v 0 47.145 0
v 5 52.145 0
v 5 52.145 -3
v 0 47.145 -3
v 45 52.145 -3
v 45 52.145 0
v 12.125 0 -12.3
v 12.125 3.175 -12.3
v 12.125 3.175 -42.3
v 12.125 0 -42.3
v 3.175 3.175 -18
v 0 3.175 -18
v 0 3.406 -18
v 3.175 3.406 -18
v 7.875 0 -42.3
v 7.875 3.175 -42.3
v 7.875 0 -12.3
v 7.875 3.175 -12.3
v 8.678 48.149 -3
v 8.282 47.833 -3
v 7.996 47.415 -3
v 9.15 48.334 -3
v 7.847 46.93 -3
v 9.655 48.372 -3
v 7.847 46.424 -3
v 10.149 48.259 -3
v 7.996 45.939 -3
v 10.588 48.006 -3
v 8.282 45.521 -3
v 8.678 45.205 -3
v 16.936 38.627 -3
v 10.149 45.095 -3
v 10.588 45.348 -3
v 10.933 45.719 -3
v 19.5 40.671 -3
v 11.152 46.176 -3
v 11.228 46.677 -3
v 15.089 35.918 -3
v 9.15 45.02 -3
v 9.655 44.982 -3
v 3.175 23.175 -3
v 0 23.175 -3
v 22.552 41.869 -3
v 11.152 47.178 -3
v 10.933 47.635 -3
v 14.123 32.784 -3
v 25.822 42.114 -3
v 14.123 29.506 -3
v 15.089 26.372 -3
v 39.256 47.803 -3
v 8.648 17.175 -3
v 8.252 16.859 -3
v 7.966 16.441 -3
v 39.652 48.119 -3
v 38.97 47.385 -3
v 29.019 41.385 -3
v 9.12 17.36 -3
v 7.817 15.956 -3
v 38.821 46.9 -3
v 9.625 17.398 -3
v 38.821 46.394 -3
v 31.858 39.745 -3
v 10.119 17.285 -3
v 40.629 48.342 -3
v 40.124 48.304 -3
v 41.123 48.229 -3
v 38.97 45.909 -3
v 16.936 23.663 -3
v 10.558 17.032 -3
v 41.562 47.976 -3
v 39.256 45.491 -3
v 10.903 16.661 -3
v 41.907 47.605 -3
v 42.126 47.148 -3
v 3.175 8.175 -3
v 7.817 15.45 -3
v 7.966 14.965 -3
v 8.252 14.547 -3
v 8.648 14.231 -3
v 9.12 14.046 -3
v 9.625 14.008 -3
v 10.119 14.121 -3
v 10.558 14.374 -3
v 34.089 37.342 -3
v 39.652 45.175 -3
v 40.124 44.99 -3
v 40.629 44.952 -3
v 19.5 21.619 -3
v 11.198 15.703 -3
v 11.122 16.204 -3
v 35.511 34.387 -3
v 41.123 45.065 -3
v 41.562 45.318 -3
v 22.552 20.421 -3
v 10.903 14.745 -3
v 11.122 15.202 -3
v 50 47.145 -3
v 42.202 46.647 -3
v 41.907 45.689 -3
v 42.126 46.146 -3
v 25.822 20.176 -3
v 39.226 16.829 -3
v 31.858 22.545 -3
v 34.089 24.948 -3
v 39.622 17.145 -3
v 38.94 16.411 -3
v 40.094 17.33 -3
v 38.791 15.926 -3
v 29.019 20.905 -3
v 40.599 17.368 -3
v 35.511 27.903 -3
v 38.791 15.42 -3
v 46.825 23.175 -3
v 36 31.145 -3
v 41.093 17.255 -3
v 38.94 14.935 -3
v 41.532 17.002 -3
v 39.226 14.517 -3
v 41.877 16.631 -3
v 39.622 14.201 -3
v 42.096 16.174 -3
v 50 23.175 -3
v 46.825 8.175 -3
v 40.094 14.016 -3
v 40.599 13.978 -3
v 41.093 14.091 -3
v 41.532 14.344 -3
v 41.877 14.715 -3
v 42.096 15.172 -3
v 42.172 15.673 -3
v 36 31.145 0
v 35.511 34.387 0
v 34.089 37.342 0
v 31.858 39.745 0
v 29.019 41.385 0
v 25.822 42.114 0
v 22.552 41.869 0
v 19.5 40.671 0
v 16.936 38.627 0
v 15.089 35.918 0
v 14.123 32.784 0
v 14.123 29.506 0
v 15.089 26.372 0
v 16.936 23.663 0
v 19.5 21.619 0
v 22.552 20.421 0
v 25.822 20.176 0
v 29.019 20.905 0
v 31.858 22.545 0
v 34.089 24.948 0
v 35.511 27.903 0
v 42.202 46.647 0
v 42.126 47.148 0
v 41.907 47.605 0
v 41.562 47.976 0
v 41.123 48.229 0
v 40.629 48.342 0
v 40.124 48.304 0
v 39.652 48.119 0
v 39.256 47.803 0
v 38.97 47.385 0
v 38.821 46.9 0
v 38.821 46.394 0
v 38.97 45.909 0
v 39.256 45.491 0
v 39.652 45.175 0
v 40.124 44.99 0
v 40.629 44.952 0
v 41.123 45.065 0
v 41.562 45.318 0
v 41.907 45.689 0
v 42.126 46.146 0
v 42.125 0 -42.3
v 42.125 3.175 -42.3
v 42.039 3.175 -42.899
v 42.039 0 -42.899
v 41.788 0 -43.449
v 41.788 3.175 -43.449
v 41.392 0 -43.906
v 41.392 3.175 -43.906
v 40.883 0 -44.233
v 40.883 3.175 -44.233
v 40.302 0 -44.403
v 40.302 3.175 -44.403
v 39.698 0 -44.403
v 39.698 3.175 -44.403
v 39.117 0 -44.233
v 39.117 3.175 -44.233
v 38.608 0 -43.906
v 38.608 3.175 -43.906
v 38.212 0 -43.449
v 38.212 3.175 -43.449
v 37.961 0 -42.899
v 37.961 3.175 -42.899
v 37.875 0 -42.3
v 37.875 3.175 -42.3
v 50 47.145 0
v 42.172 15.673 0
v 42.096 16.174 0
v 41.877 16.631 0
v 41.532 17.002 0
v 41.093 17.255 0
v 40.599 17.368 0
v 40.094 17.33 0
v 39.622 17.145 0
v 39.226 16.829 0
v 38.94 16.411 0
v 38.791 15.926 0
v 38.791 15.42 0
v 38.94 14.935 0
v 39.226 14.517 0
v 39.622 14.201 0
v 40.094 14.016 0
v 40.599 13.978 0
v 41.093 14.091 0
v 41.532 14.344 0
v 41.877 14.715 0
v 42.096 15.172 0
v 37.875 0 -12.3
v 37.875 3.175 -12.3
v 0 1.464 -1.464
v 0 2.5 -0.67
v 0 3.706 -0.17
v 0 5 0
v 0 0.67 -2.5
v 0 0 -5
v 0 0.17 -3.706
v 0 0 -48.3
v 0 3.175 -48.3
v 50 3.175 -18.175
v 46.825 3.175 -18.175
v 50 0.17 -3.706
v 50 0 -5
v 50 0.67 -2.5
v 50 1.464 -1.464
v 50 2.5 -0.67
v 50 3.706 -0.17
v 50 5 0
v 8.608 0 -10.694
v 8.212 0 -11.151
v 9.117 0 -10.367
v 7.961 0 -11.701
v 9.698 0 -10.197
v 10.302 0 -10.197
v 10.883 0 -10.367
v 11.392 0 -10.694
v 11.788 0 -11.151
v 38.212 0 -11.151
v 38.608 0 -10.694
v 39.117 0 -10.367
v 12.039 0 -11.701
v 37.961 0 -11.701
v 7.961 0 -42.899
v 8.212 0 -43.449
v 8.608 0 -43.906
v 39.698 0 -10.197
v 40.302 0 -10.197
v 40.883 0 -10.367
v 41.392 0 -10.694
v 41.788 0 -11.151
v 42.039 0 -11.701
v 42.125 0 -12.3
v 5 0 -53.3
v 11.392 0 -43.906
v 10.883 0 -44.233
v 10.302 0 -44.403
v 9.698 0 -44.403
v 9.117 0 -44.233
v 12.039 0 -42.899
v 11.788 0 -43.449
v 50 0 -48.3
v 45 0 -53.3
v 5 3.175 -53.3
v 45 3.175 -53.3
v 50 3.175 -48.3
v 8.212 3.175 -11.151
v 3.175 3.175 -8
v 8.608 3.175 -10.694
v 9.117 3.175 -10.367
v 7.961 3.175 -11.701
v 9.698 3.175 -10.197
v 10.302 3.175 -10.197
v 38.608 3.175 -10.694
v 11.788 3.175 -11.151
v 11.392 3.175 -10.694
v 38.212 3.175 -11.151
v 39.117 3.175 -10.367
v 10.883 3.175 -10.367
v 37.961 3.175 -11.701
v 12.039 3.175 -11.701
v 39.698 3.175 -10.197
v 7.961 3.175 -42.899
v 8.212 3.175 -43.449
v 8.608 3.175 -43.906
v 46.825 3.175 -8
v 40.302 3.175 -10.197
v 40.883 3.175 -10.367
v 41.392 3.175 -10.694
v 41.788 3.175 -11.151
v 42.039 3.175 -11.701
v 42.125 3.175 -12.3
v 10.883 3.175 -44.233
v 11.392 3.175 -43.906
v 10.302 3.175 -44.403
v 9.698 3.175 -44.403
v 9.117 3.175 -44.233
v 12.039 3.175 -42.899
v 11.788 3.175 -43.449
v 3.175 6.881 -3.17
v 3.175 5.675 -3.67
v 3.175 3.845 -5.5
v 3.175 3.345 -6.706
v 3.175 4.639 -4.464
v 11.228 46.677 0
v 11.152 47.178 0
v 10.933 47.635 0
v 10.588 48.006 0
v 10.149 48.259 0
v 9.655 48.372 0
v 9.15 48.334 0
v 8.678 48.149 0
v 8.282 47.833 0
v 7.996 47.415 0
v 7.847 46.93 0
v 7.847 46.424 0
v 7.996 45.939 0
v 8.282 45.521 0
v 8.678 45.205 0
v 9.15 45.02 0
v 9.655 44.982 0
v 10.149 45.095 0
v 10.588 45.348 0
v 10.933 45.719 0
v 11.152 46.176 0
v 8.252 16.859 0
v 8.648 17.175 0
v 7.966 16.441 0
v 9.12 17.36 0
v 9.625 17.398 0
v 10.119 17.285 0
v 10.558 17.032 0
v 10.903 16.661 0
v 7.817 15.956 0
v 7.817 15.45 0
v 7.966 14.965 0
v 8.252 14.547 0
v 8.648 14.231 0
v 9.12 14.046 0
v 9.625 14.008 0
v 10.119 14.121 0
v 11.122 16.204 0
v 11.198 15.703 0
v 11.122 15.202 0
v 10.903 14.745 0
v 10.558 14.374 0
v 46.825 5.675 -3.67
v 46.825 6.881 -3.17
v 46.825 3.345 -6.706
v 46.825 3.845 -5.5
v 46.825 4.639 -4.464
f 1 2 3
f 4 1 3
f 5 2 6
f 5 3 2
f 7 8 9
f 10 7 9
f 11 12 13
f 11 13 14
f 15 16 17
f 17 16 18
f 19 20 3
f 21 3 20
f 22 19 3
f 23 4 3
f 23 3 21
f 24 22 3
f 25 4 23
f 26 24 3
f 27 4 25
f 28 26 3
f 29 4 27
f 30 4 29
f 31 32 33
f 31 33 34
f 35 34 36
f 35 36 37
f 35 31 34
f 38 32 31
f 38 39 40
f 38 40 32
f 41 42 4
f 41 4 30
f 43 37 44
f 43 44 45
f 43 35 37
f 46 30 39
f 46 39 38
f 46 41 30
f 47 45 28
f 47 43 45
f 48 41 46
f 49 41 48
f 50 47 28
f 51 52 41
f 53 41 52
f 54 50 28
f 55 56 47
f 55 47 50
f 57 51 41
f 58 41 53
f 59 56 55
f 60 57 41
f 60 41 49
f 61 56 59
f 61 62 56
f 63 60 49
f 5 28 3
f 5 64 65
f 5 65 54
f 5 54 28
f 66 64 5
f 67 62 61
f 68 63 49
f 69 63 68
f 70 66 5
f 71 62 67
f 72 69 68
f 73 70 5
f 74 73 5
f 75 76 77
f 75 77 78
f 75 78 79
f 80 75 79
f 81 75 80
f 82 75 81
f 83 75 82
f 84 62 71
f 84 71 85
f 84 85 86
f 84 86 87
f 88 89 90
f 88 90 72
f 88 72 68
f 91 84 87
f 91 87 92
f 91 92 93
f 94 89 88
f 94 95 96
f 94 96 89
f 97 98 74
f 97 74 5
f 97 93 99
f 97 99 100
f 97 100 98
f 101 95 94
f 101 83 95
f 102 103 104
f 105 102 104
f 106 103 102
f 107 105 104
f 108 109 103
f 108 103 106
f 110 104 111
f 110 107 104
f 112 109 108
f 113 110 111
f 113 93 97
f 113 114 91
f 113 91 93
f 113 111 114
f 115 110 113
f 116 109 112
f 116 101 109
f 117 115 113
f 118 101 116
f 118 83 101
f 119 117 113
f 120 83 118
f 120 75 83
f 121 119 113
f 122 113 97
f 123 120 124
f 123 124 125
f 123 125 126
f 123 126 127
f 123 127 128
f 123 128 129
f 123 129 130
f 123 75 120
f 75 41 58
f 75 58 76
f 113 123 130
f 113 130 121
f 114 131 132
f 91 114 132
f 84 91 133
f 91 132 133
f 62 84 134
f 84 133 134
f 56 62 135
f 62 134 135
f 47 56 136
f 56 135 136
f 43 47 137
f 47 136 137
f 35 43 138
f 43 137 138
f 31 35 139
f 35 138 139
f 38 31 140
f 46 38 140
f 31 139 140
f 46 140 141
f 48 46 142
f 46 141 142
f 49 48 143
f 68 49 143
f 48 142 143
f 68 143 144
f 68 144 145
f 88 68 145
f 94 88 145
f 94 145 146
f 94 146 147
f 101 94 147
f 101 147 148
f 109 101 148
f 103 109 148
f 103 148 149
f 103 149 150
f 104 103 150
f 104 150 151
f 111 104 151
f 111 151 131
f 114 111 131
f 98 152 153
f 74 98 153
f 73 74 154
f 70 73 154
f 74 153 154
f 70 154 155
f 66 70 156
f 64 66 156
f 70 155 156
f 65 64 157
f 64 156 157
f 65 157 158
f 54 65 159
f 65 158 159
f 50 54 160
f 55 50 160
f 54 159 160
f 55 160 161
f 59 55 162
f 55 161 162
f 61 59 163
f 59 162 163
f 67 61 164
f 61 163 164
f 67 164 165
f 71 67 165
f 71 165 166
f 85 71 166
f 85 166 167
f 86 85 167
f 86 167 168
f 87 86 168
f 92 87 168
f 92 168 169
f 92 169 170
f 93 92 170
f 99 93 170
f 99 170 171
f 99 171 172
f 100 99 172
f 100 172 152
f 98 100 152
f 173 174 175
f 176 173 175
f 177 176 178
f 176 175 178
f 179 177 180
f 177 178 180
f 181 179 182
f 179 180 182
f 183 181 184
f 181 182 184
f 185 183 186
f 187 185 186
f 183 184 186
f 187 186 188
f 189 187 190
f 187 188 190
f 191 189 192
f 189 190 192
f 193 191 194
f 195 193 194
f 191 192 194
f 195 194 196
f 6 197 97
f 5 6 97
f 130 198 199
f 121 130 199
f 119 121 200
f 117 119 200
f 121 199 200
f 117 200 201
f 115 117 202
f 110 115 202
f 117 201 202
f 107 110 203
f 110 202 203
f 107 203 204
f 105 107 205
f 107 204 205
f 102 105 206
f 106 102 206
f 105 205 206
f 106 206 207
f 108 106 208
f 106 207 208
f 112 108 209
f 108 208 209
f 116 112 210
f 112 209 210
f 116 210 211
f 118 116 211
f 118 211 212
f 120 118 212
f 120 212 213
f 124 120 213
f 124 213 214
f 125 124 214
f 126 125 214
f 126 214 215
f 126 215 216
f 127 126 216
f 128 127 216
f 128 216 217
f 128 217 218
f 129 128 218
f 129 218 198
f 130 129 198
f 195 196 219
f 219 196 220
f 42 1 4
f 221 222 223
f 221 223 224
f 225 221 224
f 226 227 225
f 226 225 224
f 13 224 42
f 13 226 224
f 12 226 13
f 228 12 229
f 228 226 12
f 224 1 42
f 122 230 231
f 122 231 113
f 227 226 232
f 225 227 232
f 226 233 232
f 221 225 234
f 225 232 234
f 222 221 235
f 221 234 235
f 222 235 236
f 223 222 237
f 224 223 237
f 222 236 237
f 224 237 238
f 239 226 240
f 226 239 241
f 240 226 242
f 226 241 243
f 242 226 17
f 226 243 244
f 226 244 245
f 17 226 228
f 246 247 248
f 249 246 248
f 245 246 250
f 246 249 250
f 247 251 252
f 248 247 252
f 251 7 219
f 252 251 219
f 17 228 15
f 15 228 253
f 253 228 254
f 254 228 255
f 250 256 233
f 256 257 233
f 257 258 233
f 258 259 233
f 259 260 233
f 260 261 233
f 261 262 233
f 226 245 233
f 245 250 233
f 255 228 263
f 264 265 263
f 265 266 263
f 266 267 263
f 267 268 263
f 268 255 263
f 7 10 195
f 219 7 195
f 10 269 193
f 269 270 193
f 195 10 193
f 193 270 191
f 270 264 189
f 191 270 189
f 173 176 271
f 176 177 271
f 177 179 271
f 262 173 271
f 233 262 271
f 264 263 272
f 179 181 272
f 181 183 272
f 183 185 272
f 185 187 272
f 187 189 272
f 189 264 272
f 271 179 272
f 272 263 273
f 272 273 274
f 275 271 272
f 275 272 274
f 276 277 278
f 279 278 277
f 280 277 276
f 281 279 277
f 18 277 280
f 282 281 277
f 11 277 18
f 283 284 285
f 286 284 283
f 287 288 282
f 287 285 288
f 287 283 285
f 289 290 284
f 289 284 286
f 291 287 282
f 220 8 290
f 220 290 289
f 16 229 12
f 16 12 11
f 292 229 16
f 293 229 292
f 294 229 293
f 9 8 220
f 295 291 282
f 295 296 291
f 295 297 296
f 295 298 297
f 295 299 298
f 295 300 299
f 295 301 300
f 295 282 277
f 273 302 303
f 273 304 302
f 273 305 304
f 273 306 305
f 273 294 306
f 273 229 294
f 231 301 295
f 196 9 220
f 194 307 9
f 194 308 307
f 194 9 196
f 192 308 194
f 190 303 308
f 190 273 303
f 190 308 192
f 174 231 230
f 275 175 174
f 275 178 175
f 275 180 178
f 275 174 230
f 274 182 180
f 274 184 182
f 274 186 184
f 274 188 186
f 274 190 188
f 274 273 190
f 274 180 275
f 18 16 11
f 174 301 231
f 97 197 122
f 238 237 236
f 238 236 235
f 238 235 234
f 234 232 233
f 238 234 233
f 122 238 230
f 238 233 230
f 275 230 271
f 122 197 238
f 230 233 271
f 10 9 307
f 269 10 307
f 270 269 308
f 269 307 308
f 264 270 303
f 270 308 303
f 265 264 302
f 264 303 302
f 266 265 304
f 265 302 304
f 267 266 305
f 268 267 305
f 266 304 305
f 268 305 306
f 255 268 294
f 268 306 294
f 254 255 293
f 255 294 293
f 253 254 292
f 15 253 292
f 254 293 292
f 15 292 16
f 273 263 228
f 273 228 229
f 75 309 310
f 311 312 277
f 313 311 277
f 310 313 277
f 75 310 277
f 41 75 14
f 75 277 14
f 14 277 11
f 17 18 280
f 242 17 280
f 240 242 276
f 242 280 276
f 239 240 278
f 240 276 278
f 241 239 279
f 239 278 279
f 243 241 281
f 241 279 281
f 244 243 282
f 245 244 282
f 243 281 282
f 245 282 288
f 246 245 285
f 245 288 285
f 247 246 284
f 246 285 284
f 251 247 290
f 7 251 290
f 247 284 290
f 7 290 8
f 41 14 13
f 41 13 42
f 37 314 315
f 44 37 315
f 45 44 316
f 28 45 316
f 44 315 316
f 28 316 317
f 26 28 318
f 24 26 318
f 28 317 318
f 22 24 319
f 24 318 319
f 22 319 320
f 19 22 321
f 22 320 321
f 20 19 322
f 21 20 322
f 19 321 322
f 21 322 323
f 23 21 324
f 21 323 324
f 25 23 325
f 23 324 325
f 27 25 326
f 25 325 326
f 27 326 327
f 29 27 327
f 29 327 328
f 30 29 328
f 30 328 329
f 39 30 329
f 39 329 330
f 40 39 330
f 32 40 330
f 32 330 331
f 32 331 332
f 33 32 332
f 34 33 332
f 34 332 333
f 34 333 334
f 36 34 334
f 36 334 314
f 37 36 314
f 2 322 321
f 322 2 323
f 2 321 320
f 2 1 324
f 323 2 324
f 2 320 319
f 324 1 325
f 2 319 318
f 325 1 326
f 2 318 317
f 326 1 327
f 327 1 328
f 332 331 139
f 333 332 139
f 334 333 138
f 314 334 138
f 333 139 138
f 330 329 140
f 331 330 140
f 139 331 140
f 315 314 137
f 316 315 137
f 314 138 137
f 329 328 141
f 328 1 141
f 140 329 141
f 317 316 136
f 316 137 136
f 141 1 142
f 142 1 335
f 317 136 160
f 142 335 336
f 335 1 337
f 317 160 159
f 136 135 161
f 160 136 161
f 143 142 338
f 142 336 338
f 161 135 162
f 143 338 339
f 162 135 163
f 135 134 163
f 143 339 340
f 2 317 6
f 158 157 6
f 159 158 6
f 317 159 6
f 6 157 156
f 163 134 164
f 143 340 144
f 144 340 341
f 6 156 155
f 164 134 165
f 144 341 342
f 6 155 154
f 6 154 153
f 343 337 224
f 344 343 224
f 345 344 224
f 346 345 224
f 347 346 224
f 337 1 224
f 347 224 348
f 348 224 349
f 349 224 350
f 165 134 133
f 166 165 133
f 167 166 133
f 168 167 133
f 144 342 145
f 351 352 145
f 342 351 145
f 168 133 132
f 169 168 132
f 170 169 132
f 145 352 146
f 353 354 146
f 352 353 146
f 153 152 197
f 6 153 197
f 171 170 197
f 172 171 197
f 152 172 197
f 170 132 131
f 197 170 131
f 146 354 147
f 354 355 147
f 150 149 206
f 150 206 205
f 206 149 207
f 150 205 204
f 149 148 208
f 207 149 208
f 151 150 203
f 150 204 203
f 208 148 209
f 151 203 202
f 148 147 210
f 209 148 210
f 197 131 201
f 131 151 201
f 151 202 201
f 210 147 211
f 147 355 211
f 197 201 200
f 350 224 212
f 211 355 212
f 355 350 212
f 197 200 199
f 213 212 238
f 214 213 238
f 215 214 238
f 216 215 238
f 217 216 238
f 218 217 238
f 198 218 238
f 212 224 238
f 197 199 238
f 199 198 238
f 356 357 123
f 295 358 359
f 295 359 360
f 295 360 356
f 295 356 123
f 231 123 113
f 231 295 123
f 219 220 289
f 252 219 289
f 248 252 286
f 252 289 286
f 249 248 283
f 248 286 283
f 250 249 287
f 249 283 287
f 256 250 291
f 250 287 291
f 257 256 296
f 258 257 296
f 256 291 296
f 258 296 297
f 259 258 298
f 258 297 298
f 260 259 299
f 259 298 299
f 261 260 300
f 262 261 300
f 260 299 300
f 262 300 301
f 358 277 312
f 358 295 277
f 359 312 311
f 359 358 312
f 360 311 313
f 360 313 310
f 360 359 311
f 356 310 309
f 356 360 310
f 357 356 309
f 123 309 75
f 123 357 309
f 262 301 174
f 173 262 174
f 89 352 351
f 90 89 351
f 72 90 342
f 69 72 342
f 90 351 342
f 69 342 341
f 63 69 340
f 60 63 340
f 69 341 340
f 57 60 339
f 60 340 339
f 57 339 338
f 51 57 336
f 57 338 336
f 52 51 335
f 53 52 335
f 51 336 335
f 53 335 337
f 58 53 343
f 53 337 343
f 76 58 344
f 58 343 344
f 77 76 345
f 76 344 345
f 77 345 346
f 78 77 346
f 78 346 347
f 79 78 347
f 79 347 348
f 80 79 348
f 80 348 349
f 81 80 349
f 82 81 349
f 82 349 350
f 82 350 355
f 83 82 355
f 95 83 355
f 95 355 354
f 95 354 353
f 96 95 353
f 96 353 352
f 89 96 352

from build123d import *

# Parameters (mm, degrees)
SKETCH1_W           = 50
SKETCH1_H           = 53.3
BOSS_EXTRUDE1_DEPTH = 3.175
SKETCH2_W           = 50
SKETCH2_H           = 3
BOSS_EXTRUDE2_DEPTH = 48.97
SKETCH3_W           = 3.175
SKETCH3_H           = 15
SKETCH3_H_2         = 15.175
BOSS_EXTRUDE3_DEPTH = 20
CUT_EXTRUDE1_DEPTH  = 65
SKETCH5_R           = 11
SKETCH5_R_2         = 1.7
CUT_EXTRUDE2_DEPTH  = 65
CUT_EXTRUDE3_DEPTH  = 65
CHAMFER1_SIZE       = 5
FILLET1_R           = 5


with BuildPart() as part:
    # Sketch1 → Boss-Extrude1 (new body)
    with BuildSketch(Plane(origin=(0, 0, 0), x_dir=(1, 0, 0), z_dir=(0, 1, 0))):
        with Locations((25, 26.65)):
            Rectangle(SKETCH1_W, SKETCH1_H)
    extrude(amount=BOSS_EXTRUDE1_DEPTH)

    # Sketch2 → Boss-Extrude2 (add)
    with BuildSketch(Plane(origin=(0, 3.175, 0), x_dir=(1, 0, 0), z_dir=(0, 1, 0))):
        with Locations((25, 1.5)):
            Rectangle(SKETCH2_W, SKETCH2_H)
    extrude(amount=BOSS_EXTRUDE2_DEPTH)

    # Sketch3 → Boss-Extrude3 (add)
    with BuildSketch(Plane(origin=(0, 3.175, 0), x_dir=(1, 0, 0), z_dir=(0, 1, 0))):
        with Locations((1.5875, 10.5)):
            Rectangle(SKETCH3_W, SKETCH3_H)
        with Locations((48.4125, 10.5875)):
            Rectangle(SKETCH3_W, SKETCH3_H_2)
    extrude(amount=BOSS_EXTRUDE3_DEPTH)

    # Sketch4 → Cut-Extrude1 (cut)
    with BuildSketch(Plane(origin=(50, 0, 0), x_dir=(0, 0, -1), z_dir=(1, 0, 0))):
        Polygon((18.175, 3.175), (3, 23.175), (18.175, 23.175), align=None)
    extrude(amount=-CUT_EXTRUDE1_DEPTH, mode=Mode.SUBTRACT)

    # Sketch5 → Cut-Extrude2 (cut)
    with BuildSketch(Plane.XY):
        with Locations((25, 31.145)):
            Circle(SKETCH5_R)
        with Locations((40.502, 46.647)):
            Circle(SKETCH5_R_2)
        with Locations((9.528, 46.677)):
            Circle(SKETCH5_R_2)
        with Locations((9.498, 15.703)):
            Circle(SKETCH5_R_2)
        with Locations((40.472, 15.673)):
            Circle(SKETCH5_R_2)
    extrude(amount=-CUT_EXTRUDE2_DEPTH, mode=Mode.SUBTRACT)

    # Sketch6 → Cut-Extrude3 (cut)
    with BuildSketch(Plane(origin=(0, 3.175, 0), x_dir=(1, 0, 0), z_dir=(0, 1, 0))):
        with BuildLine():
            ThreePointArc((42.125, 42.3), (40, 44.425), (37.875, 42.3))
            Line((37.875, 42.3), (37.875, 12.3))
            ThreePointArc((37.875, 12.3), (40, 10.175), (42.125, 12.3))
            Line((42.125, 12.3), (42.125, 42.3))
        make_face()
        with BuildLine():
            Line((7.875, 42.3), (7.875, 12.3))
            ThreePointArc((7.875, 12.3), (10, 10.175), (12.125, 12.3))
            Line((12.125, 12.3), (12.125, 42.3))
            ThreePointArc((12.125, 42.3), (10, 44.425), (7.875, 42.3))
        make_face()
    extrude(amount=-CUT_EXTRUDE3_DEPTH, mode=Mode.SUBTRACT)

    # Chamfer1
    chamfer1_edges = [part.edges().sort_by_distance(p)[0] for p in [
        (0, 1.5875, -53.3),
        (50, 1.5875, -53.3),
        (0, 52.145, -1.5),
        (50, 52.145, -1.5),
    ]]
    chamfer(chamfer1_edges, length=CHAMFER1_SIZE)

    # Fillet1
    fillet1_edges = [part.edges().sort_by_distance(p)[0] for p in [
        (25, 3.175, -3),
        (25, 0, 0),
    ]]
    fillet(fillet1_edges, radius=FILLET1_R)


solid = part.part
